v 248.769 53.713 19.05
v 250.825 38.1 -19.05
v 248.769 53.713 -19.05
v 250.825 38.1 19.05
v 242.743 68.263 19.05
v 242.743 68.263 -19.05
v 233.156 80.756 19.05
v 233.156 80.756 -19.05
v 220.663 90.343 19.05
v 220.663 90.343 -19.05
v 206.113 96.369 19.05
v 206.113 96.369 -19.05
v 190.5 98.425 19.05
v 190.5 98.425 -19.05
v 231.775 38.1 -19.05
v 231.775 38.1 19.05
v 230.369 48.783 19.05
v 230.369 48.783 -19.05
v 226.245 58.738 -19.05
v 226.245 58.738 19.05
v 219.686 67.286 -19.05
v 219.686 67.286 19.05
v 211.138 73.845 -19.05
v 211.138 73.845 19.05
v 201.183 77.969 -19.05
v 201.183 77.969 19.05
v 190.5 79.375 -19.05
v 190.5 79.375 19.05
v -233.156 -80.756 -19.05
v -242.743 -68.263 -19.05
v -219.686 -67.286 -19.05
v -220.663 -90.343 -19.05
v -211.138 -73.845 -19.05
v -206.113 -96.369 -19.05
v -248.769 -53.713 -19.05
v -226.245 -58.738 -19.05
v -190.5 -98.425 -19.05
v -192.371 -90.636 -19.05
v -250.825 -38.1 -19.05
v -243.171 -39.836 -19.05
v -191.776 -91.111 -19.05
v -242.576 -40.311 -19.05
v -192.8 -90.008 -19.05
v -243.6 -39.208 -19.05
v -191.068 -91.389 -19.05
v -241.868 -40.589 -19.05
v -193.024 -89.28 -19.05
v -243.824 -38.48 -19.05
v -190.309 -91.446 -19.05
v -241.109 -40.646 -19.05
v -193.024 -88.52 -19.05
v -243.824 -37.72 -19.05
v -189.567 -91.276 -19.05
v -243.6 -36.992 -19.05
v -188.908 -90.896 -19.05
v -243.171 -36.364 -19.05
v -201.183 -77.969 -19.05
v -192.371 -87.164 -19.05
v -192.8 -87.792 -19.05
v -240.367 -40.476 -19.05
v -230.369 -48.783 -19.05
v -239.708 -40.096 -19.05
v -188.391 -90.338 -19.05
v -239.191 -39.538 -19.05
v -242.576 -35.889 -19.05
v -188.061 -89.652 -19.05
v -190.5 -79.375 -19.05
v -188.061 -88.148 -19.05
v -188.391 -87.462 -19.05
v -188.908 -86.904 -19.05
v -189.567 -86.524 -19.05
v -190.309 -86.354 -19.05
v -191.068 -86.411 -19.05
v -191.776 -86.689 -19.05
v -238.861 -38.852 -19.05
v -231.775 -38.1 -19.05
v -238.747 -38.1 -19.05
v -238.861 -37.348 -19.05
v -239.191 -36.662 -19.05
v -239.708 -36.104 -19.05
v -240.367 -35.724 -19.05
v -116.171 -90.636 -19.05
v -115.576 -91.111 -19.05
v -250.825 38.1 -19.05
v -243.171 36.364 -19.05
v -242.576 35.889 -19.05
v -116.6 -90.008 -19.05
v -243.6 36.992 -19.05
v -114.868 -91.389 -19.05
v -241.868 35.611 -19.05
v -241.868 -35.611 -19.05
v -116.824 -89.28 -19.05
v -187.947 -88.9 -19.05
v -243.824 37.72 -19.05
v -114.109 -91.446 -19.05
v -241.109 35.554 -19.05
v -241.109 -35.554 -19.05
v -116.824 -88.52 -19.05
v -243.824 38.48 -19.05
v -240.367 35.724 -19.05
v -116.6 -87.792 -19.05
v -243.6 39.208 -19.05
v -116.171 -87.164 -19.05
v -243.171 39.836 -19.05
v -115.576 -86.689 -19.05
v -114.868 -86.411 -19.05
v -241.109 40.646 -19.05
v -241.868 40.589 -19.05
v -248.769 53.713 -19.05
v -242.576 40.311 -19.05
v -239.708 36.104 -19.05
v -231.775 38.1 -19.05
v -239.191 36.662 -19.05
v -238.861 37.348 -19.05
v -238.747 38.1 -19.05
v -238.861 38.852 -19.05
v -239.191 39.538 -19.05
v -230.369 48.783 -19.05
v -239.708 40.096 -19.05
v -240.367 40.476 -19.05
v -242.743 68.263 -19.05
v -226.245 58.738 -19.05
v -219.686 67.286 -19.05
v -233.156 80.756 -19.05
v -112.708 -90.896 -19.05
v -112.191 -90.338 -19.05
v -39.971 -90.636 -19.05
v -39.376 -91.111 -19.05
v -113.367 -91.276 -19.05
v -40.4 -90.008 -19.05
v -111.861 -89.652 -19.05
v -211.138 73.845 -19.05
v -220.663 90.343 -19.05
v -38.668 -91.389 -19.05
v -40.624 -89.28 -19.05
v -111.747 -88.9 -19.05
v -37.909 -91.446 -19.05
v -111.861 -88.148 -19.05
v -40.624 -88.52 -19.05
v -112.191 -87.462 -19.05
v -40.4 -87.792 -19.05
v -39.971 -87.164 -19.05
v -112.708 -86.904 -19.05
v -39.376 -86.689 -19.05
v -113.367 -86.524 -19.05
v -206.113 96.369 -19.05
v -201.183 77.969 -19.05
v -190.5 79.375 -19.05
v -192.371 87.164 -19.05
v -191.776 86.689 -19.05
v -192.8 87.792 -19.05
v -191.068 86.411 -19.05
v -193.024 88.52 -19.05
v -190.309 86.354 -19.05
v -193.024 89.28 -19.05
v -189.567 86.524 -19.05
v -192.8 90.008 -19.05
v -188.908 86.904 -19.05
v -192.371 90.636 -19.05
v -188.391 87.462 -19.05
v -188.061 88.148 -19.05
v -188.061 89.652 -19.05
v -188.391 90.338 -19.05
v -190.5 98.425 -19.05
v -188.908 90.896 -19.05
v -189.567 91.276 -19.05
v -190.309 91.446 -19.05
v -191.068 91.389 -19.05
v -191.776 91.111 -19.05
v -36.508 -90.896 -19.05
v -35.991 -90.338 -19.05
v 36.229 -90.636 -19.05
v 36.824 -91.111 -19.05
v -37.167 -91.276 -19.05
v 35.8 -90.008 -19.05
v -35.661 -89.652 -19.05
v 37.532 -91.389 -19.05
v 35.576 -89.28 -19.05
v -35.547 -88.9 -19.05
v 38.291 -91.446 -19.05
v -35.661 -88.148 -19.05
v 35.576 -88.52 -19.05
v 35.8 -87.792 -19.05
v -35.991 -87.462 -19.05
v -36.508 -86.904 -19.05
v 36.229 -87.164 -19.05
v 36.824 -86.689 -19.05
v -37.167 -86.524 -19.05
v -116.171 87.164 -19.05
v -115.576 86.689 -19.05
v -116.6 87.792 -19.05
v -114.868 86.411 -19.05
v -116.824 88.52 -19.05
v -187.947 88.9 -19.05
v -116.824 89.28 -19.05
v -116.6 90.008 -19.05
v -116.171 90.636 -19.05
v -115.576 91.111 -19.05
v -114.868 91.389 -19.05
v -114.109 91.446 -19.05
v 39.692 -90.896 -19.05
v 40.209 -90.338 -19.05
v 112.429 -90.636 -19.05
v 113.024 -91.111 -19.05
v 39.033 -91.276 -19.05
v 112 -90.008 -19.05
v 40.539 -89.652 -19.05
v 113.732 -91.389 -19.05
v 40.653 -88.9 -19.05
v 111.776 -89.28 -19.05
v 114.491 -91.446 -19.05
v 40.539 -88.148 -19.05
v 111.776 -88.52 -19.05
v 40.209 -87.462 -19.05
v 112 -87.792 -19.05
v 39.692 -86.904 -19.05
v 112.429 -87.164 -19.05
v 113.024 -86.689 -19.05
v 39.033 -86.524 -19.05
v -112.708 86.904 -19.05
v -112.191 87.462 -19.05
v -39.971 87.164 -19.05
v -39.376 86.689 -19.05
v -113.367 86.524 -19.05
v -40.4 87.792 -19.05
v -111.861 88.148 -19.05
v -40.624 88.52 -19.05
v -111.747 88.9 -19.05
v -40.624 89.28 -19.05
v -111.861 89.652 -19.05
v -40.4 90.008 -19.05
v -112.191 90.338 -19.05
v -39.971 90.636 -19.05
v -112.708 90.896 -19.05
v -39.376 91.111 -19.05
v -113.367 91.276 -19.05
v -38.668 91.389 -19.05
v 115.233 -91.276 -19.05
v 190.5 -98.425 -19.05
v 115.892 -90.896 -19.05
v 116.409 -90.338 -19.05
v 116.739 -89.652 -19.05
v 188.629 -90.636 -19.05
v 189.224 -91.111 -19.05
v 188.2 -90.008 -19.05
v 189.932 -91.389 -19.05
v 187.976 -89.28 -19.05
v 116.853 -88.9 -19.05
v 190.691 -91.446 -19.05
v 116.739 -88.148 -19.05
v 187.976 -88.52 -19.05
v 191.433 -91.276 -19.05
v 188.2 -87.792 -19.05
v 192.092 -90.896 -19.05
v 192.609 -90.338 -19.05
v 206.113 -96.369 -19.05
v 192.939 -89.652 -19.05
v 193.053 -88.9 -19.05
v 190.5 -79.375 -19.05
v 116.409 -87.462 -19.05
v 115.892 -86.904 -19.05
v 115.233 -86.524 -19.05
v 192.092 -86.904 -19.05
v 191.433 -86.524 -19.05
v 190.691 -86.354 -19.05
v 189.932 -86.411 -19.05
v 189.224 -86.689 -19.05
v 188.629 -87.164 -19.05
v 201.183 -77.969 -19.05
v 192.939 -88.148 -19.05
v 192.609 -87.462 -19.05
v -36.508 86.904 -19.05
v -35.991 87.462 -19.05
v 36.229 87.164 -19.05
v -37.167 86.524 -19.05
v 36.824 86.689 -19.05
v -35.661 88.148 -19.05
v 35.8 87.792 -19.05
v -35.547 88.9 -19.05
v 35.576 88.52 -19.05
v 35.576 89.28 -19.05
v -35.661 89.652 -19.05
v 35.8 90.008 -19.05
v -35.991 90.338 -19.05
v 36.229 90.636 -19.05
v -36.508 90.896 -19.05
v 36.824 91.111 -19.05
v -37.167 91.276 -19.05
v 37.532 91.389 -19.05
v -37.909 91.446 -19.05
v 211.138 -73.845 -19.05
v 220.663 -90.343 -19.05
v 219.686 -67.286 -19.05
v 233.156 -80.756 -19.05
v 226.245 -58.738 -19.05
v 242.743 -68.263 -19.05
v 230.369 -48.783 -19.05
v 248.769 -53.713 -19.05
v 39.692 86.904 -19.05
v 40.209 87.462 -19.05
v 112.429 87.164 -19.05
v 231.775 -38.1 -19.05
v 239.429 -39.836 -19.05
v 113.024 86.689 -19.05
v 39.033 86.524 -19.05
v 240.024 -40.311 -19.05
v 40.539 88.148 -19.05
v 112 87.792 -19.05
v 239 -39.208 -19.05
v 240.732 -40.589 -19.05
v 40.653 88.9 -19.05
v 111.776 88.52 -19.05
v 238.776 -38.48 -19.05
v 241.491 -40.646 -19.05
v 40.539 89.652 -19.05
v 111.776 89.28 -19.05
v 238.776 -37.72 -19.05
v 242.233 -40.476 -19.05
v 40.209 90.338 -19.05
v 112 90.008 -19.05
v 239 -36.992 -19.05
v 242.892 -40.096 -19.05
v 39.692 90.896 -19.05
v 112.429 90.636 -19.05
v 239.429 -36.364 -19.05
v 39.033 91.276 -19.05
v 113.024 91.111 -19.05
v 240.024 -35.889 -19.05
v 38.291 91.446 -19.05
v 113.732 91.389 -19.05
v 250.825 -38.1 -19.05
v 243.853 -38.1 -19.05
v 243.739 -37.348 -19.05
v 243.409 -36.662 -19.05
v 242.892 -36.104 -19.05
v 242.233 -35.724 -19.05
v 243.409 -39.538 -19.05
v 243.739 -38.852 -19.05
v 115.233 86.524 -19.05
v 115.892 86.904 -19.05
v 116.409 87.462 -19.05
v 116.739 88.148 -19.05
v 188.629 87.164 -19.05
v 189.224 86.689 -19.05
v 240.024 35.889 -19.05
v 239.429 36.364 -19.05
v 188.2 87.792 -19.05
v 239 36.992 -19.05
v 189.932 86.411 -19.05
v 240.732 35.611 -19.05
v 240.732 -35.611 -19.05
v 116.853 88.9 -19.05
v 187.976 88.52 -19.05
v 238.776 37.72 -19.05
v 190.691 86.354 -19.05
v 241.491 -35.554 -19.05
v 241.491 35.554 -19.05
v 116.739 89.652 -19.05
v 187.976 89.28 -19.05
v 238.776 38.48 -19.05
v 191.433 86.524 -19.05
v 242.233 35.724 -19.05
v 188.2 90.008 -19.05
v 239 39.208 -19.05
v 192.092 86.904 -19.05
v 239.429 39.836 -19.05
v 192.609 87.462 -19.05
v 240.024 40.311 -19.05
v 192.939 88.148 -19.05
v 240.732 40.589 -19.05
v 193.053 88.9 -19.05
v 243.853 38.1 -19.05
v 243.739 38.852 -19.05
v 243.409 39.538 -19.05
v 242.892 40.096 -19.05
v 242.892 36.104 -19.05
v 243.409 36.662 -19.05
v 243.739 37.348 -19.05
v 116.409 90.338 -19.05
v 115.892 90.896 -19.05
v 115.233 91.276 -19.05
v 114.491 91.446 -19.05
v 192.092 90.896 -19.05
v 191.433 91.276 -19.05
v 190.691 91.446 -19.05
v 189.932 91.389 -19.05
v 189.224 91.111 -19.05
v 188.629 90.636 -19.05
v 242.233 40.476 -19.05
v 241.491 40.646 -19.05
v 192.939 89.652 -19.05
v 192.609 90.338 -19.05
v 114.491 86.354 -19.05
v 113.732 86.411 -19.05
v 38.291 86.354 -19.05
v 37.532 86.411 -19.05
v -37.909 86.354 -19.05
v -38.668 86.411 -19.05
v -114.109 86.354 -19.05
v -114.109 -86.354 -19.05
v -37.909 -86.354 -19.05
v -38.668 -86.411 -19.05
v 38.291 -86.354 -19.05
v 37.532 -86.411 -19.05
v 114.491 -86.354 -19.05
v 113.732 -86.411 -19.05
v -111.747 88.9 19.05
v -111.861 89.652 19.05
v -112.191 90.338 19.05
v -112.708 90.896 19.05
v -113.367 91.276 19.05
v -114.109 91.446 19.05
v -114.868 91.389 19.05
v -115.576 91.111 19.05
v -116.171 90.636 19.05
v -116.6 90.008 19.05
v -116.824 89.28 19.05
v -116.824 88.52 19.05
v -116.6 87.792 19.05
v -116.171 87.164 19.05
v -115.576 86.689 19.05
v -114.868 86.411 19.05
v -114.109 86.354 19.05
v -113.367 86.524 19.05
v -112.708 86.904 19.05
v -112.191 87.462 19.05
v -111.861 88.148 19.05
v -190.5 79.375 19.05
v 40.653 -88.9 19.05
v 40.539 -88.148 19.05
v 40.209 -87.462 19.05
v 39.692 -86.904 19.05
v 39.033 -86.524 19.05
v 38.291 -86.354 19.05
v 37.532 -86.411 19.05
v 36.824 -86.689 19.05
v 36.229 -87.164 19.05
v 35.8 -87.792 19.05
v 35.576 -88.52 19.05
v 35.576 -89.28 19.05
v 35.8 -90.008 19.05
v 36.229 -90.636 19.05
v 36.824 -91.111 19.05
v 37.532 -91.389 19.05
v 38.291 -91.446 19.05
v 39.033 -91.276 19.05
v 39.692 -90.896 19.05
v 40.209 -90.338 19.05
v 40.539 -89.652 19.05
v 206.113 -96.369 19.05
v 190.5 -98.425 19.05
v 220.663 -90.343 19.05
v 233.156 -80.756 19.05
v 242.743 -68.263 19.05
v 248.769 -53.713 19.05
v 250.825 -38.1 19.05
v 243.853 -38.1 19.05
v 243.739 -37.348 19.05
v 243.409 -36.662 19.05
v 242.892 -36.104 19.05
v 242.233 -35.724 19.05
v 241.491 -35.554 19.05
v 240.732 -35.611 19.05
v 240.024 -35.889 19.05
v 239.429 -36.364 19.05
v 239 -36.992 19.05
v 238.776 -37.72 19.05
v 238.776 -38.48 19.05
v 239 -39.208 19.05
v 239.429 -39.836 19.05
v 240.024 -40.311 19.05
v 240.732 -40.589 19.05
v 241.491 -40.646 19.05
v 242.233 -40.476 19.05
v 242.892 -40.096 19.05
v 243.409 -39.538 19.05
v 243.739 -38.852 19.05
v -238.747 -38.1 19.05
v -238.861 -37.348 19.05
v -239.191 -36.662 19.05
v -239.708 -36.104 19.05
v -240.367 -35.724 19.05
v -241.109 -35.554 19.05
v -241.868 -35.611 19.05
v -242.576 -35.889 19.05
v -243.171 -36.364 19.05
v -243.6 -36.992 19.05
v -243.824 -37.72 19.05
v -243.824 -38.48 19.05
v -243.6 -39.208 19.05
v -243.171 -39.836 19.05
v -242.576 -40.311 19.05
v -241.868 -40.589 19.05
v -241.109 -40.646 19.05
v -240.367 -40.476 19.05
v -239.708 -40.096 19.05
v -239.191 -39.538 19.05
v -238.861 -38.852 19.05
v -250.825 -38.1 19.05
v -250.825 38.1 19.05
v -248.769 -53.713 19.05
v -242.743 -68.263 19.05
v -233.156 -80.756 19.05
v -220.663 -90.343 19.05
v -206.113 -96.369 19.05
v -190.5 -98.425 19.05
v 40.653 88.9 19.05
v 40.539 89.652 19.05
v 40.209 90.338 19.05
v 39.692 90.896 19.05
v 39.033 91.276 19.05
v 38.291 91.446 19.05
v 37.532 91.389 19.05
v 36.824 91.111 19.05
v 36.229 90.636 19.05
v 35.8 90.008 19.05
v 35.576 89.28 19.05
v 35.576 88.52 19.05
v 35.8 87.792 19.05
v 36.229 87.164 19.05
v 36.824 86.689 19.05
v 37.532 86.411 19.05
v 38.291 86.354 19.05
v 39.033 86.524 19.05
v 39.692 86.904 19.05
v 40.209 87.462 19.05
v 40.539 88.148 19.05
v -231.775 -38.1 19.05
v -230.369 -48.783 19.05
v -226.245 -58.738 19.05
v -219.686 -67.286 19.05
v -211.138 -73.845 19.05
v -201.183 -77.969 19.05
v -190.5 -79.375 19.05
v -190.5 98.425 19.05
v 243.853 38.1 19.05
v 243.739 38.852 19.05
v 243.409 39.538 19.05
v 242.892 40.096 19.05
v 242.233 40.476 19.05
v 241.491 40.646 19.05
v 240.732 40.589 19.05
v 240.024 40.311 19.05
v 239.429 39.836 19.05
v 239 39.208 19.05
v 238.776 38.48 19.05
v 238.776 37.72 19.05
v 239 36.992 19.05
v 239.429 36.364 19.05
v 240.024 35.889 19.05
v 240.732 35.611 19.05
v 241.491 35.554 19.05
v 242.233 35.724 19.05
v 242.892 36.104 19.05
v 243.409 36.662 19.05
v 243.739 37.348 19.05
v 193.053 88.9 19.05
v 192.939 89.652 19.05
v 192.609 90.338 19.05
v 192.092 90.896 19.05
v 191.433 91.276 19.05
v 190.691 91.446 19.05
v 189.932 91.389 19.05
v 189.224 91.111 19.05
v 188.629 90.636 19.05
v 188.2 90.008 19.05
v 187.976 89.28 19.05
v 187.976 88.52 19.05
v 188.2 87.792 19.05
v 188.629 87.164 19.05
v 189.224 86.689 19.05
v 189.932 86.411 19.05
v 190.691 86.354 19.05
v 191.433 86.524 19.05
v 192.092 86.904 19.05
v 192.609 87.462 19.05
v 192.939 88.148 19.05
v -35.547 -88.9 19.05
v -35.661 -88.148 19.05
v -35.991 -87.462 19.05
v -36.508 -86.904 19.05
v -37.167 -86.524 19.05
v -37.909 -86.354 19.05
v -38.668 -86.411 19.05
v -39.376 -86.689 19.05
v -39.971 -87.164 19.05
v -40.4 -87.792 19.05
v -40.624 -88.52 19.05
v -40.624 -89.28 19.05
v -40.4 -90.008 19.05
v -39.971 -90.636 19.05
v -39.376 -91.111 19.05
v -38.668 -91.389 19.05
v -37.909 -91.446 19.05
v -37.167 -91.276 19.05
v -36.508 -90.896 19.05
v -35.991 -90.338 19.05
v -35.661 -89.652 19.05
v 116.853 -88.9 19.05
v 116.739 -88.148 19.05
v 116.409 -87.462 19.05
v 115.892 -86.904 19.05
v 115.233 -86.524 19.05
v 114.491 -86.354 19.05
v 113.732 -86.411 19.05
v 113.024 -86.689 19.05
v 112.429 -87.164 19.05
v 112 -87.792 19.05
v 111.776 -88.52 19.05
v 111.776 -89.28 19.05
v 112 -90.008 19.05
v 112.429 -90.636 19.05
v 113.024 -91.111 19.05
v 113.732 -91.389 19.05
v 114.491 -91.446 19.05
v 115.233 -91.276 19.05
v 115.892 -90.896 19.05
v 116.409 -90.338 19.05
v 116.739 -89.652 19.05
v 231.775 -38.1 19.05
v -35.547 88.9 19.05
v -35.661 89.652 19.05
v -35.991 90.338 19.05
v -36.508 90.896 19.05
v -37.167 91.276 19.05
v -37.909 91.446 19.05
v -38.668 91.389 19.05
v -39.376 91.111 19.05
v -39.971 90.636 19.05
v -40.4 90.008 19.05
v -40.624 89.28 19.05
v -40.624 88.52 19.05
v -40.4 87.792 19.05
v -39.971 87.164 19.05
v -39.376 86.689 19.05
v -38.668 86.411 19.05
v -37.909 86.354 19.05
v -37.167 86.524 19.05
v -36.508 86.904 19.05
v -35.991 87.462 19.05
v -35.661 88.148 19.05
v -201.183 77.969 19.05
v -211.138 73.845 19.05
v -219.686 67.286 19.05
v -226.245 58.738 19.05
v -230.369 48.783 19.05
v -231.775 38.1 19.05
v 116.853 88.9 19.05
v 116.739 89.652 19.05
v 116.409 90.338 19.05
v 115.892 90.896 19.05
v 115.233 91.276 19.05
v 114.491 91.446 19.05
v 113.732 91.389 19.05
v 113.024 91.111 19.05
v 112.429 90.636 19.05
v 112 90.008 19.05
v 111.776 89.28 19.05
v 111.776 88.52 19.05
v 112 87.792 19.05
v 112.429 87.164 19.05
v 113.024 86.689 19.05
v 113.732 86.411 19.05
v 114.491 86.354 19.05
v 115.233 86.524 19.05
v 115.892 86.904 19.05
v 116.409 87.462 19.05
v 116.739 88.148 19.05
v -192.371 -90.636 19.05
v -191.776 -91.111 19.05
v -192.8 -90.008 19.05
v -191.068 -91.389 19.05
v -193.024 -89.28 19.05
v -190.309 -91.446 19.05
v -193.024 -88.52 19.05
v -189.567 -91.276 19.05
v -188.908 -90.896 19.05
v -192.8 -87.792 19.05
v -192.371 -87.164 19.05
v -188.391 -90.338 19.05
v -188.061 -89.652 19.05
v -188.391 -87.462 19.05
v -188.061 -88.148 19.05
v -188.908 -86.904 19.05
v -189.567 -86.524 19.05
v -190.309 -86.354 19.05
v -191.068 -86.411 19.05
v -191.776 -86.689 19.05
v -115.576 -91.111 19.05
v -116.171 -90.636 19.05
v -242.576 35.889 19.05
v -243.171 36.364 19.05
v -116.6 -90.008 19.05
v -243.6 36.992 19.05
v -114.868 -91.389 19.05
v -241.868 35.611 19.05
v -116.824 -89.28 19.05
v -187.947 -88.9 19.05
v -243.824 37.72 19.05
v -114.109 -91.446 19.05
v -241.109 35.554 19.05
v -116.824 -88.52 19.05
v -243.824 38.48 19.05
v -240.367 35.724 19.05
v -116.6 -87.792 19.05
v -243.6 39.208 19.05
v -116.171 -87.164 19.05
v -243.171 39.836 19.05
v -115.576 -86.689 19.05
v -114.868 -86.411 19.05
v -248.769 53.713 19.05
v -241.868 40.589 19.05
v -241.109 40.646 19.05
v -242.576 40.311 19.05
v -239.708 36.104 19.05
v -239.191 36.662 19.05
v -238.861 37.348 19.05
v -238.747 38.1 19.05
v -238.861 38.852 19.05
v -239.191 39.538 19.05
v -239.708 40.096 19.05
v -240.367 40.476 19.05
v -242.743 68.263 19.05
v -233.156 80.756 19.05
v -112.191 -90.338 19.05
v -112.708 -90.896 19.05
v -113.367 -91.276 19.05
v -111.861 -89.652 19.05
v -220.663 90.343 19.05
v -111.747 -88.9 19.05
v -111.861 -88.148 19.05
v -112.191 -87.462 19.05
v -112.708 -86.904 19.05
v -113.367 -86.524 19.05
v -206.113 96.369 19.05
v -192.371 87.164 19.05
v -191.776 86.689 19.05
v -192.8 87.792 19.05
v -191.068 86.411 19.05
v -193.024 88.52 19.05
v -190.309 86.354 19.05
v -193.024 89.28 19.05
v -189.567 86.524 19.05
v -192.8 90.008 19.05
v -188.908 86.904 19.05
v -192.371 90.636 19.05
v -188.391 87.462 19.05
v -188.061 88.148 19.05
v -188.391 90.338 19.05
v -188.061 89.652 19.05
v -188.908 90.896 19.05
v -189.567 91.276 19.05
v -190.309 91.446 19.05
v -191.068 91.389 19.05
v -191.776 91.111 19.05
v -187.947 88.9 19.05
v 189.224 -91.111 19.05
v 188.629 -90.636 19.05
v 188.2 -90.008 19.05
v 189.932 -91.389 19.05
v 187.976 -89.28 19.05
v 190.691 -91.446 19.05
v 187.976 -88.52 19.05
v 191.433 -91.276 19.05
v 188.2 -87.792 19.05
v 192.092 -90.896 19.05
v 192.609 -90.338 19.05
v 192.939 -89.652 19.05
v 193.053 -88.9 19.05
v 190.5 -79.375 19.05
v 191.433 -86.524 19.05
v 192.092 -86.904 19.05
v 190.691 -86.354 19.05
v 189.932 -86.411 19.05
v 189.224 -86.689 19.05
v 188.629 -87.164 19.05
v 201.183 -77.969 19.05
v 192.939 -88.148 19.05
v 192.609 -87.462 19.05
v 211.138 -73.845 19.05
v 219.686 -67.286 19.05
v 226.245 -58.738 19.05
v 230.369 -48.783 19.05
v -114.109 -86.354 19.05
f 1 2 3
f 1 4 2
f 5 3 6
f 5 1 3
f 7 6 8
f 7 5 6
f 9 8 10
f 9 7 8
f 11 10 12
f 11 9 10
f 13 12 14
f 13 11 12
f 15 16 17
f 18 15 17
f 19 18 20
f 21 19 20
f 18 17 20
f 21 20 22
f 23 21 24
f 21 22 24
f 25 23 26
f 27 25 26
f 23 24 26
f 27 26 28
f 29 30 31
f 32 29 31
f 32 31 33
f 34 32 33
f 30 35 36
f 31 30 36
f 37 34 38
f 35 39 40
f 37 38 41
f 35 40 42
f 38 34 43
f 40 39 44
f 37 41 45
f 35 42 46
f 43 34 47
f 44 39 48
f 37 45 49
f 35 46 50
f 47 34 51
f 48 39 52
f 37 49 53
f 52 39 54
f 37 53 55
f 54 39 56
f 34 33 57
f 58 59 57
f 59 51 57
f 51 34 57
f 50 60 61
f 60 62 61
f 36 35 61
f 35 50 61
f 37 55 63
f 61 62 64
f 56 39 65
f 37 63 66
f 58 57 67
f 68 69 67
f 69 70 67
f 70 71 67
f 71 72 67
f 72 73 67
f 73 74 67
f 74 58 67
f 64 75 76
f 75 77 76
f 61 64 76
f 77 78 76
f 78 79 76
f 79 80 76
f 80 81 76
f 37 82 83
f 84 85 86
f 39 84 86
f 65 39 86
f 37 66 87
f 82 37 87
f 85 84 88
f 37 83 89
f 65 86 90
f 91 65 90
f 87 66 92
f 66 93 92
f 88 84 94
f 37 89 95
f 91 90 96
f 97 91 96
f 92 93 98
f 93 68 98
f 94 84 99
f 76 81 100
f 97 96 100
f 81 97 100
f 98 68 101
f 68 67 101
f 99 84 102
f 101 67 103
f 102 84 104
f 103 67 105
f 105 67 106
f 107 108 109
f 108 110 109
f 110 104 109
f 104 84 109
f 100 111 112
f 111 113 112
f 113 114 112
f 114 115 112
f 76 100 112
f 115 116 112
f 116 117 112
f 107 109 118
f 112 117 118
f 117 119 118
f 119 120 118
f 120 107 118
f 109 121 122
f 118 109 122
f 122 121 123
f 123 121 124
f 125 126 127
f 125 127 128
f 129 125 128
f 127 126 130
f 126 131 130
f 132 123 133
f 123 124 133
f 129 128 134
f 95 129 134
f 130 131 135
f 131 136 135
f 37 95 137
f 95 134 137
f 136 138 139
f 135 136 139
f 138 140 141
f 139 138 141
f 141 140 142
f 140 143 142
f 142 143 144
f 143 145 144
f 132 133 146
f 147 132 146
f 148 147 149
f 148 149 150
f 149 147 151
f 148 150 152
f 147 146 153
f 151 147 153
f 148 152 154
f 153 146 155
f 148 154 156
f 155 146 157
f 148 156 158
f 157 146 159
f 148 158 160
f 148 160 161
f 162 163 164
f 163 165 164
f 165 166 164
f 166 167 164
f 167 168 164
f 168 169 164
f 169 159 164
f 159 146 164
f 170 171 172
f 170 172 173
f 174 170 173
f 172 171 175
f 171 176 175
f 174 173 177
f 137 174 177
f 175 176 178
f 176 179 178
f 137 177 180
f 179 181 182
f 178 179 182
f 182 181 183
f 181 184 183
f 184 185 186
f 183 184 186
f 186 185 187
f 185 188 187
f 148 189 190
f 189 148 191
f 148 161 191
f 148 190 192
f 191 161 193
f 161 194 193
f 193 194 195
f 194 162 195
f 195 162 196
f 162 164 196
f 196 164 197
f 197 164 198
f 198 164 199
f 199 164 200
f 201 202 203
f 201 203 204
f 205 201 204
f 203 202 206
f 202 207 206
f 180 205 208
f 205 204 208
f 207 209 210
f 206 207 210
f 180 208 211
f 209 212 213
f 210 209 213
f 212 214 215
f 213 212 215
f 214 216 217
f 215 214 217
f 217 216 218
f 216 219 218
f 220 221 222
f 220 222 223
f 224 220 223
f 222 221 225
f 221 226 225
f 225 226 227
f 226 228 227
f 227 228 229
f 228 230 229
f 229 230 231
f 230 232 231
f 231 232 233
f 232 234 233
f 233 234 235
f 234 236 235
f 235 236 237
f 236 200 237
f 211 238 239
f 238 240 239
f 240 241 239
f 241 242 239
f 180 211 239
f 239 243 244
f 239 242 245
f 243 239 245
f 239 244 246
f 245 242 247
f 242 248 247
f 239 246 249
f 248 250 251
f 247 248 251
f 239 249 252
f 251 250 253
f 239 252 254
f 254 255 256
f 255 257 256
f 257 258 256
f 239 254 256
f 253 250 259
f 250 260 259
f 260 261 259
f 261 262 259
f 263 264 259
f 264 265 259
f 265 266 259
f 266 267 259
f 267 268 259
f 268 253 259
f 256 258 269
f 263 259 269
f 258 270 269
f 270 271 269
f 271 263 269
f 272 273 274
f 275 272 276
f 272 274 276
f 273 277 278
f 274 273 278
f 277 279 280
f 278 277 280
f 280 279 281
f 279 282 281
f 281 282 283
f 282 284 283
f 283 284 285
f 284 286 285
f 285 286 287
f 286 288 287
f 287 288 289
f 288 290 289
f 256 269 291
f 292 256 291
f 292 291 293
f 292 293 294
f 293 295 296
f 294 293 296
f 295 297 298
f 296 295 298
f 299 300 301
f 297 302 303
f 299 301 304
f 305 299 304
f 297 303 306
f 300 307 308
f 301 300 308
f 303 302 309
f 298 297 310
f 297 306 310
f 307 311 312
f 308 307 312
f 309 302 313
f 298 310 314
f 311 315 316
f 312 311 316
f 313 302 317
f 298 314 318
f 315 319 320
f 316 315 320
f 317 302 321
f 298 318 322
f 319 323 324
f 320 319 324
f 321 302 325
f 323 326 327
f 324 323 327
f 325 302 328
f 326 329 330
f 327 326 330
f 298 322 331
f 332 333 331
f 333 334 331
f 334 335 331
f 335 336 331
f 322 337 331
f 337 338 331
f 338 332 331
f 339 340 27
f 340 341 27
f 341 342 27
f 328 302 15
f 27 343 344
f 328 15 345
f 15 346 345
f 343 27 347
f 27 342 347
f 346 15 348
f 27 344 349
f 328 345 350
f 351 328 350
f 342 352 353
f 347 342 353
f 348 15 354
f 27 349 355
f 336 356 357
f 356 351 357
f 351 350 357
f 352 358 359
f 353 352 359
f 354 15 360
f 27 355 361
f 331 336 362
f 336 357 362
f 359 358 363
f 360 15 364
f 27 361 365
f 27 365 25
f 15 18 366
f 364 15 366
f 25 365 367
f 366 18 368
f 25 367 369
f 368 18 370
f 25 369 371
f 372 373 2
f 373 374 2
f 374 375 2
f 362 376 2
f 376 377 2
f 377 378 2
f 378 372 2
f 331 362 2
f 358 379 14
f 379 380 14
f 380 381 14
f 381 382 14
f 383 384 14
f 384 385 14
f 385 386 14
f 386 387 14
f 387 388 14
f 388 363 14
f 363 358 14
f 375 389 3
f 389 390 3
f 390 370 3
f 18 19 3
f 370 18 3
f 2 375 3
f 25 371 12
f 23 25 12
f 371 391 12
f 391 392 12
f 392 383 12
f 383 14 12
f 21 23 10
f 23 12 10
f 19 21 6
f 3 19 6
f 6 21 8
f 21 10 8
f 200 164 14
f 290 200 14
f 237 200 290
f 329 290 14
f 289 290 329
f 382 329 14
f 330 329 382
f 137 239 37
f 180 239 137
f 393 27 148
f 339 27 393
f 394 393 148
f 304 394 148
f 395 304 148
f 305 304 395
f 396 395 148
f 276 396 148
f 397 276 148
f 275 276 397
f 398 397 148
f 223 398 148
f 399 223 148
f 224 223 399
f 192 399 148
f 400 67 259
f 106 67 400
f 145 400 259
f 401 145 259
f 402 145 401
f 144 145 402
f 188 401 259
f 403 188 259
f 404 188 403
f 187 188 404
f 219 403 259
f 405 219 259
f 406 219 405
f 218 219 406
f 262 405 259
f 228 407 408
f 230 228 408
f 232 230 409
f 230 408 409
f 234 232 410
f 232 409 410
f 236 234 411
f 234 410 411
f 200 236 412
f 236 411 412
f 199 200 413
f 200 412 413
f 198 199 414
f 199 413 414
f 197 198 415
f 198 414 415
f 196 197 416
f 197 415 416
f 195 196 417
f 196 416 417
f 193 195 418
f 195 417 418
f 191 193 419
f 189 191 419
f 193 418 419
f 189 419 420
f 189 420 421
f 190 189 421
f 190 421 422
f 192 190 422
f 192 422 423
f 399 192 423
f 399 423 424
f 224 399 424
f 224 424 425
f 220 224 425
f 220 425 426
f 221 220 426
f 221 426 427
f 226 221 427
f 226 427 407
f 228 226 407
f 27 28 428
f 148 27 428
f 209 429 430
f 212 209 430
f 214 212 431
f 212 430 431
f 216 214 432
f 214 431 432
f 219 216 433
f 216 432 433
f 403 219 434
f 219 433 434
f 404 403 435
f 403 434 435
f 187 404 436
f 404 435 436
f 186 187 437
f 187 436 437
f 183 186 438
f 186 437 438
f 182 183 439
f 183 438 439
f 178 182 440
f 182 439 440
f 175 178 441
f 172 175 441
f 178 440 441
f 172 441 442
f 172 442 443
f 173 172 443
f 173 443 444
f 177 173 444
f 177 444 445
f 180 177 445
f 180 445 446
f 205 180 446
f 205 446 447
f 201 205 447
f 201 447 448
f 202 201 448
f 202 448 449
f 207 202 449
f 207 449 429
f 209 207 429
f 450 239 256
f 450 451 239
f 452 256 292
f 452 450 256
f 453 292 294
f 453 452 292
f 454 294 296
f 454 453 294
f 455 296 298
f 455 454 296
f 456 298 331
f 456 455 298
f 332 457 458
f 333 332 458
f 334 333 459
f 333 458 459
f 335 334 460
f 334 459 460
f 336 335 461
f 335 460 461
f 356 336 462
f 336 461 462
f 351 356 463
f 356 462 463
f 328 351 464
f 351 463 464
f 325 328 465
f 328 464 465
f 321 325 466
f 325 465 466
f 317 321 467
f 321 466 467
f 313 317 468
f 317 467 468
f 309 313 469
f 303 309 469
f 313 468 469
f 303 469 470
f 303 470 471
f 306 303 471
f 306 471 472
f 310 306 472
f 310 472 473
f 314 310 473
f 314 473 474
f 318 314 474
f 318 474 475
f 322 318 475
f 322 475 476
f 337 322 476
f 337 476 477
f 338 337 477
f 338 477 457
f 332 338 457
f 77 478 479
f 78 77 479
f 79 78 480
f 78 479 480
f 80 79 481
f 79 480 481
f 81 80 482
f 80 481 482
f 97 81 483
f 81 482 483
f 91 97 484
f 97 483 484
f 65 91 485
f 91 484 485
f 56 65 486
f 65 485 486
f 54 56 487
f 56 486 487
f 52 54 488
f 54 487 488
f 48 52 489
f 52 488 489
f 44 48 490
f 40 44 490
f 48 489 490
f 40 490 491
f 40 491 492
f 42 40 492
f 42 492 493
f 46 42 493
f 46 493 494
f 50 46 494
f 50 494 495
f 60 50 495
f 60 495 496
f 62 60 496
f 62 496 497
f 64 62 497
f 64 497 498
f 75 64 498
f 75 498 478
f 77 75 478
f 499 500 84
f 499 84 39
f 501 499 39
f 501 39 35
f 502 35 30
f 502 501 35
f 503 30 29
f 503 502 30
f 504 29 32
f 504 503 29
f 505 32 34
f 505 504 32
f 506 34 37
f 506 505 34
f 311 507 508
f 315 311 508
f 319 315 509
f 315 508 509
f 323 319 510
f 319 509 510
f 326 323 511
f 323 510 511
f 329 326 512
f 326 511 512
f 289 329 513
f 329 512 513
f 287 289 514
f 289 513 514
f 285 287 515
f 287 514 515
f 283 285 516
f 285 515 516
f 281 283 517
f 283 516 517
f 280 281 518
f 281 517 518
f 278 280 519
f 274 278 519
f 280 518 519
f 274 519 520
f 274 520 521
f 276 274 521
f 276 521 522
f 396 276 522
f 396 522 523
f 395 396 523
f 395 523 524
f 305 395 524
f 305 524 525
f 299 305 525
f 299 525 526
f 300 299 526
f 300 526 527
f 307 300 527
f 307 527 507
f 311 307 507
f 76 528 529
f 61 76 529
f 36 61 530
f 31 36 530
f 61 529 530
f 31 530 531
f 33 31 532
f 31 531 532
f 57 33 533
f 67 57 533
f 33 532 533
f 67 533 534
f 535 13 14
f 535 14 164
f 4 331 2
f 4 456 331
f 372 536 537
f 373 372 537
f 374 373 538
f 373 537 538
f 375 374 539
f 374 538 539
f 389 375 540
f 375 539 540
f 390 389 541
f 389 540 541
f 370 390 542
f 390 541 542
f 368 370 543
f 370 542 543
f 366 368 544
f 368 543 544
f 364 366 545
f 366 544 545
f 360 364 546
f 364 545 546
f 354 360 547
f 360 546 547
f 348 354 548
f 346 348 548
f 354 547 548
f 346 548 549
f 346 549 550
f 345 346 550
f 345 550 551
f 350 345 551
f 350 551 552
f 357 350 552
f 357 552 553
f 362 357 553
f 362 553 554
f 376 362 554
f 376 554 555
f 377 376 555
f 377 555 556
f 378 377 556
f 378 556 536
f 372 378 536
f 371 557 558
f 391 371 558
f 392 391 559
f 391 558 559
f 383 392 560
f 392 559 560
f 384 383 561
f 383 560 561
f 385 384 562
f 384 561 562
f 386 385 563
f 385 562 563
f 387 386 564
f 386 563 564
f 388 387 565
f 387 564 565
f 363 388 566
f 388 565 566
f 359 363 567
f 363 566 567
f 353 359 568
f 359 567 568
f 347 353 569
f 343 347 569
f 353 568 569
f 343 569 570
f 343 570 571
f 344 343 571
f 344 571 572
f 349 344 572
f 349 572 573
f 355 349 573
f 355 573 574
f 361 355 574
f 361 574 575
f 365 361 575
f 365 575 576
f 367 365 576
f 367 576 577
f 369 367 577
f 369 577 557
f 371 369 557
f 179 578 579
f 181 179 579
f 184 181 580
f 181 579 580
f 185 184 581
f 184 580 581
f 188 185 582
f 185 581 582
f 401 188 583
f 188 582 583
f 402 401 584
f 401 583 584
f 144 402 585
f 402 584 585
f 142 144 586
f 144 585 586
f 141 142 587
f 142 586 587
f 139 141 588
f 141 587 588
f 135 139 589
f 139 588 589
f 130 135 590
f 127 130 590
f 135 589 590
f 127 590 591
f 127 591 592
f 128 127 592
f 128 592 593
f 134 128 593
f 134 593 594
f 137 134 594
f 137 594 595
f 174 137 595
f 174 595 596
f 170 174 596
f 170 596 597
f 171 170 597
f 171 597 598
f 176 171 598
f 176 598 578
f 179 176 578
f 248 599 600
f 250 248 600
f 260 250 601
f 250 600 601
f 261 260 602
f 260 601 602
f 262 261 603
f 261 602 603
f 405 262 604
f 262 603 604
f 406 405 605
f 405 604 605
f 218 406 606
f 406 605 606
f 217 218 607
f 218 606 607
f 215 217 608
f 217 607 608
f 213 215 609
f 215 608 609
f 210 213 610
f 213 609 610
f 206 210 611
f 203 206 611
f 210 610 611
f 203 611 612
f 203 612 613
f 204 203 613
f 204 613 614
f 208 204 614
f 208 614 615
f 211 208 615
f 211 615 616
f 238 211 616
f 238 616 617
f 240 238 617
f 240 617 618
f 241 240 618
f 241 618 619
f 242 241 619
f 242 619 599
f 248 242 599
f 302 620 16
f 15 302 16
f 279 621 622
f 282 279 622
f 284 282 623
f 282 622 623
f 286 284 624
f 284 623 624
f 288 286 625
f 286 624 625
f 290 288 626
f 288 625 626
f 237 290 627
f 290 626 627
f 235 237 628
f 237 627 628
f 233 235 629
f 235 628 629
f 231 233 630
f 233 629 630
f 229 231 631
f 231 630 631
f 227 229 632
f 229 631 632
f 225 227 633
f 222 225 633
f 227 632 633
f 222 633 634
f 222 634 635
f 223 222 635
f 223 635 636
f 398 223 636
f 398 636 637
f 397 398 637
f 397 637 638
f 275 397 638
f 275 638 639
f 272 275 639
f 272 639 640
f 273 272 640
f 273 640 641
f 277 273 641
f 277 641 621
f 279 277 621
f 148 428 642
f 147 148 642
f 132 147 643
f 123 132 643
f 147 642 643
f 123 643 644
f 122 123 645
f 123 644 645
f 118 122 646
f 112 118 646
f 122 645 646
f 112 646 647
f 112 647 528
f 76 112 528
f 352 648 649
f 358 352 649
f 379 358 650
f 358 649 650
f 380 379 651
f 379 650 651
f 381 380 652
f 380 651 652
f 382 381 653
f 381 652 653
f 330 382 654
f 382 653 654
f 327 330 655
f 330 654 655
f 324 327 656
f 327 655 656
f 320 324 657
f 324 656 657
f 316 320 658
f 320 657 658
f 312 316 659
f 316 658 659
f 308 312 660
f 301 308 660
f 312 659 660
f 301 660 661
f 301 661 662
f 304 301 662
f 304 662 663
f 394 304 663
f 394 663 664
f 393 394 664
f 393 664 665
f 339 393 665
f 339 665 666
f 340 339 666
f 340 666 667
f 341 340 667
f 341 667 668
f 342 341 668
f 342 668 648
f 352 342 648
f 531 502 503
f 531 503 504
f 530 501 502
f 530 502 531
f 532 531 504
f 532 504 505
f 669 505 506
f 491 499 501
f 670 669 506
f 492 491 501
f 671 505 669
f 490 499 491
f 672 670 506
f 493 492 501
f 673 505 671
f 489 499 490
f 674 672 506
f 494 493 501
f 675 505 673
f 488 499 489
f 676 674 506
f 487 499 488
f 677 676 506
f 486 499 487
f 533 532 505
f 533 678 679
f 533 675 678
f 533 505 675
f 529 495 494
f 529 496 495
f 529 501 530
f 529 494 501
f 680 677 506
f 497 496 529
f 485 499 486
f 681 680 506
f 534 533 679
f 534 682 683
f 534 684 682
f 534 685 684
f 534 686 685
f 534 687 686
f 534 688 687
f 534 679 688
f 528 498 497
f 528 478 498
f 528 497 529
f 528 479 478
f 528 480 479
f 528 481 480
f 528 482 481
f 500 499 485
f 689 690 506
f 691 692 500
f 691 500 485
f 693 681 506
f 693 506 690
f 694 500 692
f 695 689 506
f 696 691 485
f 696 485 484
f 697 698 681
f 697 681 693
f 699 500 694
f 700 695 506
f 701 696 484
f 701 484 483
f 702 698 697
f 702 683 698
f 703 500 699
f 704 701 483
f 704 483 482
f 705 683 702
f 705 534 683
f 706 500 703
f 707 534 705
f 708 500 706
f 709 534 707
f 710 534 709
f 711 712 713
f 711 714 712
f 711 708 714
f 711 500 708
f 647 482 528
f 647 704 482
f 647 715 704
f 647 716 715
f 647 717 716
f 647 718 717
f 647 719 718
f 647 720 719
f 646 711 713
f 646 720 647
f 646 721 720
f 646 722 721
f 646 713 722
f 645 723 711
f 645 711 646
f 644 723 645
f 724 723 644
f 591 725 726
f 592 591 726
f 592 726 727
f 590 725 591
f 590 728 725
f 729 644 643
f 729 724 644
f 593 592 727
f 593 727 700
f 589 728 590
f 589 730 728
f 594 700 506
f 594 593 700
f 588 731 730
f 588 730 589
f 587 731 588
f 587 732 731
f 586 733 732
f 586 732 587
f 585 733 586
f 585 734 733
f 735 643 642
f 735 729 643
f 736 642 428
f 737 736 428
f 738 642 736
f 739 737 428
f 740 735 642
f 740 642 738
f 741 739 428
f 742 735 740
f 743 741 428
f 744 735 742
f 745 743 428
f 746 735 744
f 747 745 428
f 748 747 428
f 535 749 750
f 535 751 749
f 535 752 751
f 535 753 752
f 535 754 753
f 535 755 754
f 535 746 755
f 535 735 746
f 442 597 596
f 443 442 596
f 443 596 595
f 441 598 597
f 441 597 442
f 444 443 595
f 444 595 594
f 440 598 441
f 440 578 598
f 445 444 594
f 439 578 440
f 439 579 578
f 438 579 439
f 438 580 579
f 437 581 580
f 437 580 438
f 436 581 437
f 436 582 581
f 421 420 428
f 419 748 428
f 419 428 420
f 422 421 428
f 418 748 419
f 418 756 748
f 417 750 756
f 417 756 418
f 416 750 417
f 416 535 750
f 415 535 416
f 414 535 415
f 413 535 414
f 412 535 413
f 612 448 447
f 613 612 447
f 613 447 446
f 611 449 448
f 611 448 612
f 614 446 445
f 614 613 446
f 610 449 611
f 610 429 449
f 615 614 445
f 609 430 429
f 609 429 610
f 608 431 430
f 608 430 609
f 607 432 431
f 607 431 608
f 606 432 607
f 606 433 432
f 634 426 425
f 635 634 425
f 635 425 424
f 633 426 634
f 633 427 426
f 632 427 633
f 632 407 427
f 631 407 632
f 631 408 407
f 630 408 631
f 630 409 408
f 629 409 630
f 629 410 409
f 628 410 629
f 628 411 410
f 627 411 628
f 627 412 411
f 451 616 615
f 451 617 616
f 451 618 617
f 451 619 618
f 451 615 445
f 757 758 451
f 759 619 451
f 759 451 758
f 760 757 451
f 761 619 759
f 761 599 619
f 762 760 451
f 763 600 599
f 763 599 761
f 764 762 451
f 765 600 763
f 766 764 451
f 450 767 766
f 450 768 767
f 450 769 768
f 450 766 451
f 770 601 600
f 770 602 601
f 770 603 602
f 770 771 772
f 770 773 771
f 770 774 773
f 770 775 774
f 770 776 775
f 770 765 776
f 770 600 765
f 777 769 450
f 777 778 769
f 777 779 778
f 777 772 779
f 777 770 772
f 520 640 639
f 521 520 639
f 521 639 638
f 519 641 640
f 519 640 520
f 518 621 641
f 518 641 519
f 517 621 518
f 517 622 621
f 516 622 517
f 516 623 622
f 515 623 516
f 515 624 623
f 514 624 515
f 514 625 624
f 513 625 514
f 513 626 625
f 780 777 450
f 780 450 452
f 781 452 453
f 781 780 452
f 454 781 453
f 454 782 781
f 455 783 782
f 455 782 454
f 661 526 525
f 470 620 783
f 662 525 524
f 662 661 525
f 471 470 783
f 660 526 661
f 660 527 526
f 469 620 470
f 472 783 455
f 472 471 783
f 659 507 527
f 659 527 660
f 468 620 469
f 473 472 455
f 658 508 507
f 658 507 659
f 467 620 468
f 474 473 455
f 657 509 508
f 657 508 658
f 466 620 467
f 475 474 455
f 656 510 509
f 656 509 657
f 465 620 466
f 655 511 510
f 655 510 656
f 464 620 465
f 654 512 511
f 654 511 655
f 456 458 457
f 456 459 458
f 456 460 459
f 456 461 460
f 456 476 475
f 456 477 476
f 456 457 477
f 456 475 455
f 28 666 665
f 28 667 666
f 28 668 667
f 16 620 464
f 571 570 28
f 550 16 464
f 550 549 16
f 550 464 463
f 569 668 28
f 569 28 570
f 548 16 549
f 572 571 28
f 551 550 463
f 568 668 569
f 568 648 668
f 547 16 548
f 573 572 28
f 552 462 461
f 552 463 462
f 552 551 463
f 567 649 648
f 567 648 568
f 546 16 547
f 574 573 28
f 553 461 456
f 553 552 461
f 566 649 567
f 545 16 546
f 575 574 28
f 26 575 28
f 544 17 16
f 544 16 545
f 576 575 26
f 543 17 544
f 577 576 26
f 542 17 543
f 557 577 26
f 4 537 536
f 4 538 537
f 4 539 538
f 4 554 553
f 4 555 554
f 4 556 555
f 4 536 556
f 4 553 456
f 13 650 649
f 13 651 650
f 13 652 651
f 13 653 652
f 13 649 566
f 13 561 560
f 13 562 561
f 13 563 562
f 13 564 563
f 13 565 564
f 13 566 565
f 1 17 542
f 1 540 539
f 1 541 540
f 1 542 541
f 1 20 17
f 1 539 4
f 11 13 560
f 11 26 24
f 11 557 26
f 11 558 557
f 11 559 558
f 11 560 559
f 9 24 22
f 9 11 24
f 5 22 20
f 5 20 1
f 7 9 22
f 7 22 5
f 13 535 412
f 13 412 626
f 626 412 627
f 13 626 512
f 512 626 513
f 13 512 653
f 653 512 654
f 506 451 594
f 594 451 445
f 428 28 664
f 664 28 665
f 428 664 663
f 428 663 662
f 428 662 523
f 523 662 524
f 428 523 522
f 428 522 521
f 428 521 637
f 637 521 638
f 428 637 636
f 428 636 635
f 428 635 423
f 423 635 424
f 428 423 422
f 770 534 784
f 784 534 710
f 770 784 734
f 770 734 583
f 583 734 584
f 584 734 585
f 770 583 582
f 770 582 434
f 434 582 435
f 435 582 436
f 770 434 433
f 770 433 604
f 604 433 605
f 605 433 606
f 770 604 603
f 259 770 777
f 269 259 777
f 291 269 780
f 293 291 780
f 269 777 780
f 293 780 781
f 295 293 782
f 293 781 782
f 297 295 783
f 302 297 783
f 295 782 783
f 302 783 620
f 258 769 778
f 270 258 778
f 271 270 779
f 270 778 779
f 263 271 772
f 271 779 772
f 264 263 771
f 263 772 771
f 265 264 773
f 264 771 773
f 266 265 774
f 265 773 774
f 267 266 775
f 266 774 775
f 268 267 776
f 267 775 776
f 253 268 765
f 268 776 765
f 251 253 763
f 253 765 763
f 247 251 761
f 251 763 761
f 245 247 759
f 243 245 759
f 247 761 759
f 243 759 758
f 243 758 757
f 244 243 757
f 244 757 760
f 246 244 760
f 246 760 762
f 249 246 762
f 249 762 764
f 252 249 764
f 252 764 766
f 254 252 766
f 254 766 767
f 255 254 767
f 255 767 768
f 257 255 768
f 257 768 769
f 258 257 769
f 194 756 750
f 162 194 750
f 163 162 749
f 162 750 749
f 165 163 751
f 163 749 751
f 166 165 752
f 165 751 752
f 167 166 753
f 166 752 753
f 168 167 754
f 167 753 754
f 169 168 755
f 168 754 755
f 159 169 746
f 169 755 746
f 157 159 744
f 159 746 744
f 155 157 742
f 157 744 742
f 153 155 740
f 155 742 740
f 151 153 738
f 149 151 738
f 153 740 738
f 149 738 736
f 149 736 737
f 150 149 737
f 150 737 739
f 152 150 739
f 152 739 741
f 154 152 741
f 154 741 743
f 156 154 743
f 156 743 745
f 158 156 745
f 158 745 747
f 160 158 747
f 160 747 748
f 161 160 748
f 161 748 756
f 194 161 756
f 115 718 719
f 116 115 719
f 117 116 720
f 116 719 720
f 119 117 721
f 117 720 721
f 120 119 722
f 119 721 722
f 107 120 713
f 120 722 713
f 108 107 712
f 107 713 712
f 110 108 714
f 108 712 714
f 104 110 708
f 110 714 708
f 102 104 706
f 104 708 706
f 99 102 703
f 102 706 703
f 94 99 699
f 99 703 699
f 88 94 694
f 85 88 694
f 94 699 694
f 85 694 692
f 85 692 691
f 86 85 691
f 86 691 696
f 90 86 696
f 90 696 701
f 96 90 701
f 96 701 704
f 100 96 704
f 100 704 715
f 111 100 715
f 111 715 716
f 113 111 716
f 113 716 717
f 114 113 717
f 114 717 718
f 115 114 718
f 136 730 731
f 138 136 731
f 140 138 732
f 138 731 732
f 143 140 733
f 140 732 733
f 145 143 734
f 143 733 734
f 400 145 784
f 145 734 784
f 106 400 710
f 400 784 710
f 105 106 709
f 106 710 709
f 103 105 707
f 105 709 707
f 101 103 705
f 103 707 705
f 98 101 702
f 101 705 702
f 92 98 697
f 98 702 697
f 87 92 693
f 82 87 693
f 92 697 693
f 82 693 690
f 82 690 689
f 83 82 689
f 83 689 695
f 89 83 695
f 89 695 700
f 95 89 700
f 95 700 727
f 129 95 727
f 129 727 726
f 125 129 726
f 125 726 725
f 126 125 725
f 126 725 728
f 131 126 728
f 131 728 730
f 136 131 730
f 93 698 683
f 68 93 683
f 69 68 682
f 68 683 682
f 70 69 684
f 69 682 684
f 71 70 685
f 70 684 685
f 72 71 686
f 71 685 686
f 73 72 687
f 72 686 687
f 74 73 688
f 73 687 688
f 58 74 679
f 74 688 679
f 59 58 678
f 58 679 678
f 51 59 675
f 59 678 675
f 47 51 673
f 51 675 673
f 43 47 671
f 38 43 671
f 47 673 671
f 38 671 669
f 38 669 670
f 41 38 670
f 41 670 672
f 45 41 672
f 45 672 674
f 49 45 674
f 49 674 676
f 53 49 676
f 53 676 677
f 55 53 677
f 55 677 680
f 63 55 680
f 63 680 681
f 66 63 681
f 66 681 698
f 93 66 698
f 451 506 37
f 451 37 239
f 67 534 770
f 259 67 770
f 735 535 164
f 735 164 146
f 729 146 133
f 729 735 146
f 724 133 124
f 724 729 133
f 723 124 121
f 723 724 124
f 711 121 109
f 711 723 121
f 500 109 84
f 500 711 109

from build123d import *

# Parameters (mm, degrees)
F1_DEPTH = 19.05
F3_DEPTH = 38.101
F4_R     = 2.5527
F5_DEPTH = 38.101


with BuildPart() as f1:
    # F0 (on Top) → F1 (new body, symmetric)
    with BuildSketch(Plane.XY):
        with BuildLine():
            ThreePointArc((250.825, 38.1), (233.1562165751, 80.7562165751), (190.5, 98.425))
            Line((190.5, 98.425), (-190.5, 98.425))
            ThreePointArc((-190.5, 98.425), (-233.1562165751, 80.7562165751), (-250.825, 38.1))
            Line((-250.825, 38.1), (-250.825, -38.1))
            ThreePointArc((-250.825, -38.1), (-233.1562165751, -80.7562165751), (-190.5, -98.425))
            Line((-190.5, -98.425), (190.5, -98.425))
            ThreePointArc((190.5, -98.425), (233.1562165751, -80.7562165751), (250.825, -38.1))
            Line((250.825, -38.1), (250.825, 38.1))
        make_face()
    extrude(amount=F1_DEPTH, both=True)

    # F2 (on face) → F3 (cut, through all)
    with BuildSketch(Plane.XY.offset(19.05)):
        with BuildLine():
            Line((190.5, 79.375), (-190.5, 79.375))
            ThreePointArc((-190.5, 79.375), (-219.6858323935, 67.2858323935), (-231.775, 38.1))
            Line((-231.775, 38.1), (-231.775, -38.1))
            ThreePointArc((-231.775, -38.1), (-219.6858323935, -67.2858323935), (-190.5, -79.375))
            Line((-190.5, -79.375), (190.5, -79.375))
            ThreePointArc((190.5, -79.375), (219.6858323935, -67.2858323935), (231.775, -38.1))
            Line((231.775, -38.1), (231.775, 38.1))
            ThreePointArc((231.775, 38.1), (219.6858323935, 67.2858323935), (190.5, 79.375))
        make_face()
    extrude(amount=-F3_DEPTH, mode=Mode.SUBTRACT)

    # F4 (on face) → F5 (cut, through all)
    with BuildSketch(Plane.XY.offset(19.05)):
        with Locations((-190.5, 88.9)):
            Circle(F4_R)
        with Locations((-38.1, 88.9)):
            Circle(F4_R)
        with Locations((-114.3, 88.9)):
            Circle(F4_R)
        with Locations((38.1, 88.9)):
            Circle(F4_R)
        with Locations((114.3, 88.9)):
            Circle(F4_R)
        with Locations((190.5, 88.9)):
            Circle(F4_R)
        with Locations((241.3000668421, 38.1)):
            Circle(F4_R)
        with Locations((241.3000668421, -38.1)):
            Circle(F4_R)
        with Locations((190.5, -88.9)):
            Circle(F4_R)
        with Locations((114.3, -88.9)):
            Circle(F4_R)
        with Locations((38.1, -88.9)):
            Circle(F4_R)
        with Locations((-38.1, -88.9)):
            Circle(F4_R)
        with Locations((-114.3, -88.9)):
            Circle(F4_R)
        with Locations((-190.5, -88.9)):
            Circle(F4_R)
        with Locations((-241.3, -38.1)):
            Circle(F4_R)
        with Locations((-241.3, 38.1)):
            Circle(F4_R)
    extrude(amount=-F5_DEPTH, mode=Mode.SUBTRACT)


with BuildPart() as f6_1:
    # F6: copy of F1
    add(f1.part)


solid = f1.part
